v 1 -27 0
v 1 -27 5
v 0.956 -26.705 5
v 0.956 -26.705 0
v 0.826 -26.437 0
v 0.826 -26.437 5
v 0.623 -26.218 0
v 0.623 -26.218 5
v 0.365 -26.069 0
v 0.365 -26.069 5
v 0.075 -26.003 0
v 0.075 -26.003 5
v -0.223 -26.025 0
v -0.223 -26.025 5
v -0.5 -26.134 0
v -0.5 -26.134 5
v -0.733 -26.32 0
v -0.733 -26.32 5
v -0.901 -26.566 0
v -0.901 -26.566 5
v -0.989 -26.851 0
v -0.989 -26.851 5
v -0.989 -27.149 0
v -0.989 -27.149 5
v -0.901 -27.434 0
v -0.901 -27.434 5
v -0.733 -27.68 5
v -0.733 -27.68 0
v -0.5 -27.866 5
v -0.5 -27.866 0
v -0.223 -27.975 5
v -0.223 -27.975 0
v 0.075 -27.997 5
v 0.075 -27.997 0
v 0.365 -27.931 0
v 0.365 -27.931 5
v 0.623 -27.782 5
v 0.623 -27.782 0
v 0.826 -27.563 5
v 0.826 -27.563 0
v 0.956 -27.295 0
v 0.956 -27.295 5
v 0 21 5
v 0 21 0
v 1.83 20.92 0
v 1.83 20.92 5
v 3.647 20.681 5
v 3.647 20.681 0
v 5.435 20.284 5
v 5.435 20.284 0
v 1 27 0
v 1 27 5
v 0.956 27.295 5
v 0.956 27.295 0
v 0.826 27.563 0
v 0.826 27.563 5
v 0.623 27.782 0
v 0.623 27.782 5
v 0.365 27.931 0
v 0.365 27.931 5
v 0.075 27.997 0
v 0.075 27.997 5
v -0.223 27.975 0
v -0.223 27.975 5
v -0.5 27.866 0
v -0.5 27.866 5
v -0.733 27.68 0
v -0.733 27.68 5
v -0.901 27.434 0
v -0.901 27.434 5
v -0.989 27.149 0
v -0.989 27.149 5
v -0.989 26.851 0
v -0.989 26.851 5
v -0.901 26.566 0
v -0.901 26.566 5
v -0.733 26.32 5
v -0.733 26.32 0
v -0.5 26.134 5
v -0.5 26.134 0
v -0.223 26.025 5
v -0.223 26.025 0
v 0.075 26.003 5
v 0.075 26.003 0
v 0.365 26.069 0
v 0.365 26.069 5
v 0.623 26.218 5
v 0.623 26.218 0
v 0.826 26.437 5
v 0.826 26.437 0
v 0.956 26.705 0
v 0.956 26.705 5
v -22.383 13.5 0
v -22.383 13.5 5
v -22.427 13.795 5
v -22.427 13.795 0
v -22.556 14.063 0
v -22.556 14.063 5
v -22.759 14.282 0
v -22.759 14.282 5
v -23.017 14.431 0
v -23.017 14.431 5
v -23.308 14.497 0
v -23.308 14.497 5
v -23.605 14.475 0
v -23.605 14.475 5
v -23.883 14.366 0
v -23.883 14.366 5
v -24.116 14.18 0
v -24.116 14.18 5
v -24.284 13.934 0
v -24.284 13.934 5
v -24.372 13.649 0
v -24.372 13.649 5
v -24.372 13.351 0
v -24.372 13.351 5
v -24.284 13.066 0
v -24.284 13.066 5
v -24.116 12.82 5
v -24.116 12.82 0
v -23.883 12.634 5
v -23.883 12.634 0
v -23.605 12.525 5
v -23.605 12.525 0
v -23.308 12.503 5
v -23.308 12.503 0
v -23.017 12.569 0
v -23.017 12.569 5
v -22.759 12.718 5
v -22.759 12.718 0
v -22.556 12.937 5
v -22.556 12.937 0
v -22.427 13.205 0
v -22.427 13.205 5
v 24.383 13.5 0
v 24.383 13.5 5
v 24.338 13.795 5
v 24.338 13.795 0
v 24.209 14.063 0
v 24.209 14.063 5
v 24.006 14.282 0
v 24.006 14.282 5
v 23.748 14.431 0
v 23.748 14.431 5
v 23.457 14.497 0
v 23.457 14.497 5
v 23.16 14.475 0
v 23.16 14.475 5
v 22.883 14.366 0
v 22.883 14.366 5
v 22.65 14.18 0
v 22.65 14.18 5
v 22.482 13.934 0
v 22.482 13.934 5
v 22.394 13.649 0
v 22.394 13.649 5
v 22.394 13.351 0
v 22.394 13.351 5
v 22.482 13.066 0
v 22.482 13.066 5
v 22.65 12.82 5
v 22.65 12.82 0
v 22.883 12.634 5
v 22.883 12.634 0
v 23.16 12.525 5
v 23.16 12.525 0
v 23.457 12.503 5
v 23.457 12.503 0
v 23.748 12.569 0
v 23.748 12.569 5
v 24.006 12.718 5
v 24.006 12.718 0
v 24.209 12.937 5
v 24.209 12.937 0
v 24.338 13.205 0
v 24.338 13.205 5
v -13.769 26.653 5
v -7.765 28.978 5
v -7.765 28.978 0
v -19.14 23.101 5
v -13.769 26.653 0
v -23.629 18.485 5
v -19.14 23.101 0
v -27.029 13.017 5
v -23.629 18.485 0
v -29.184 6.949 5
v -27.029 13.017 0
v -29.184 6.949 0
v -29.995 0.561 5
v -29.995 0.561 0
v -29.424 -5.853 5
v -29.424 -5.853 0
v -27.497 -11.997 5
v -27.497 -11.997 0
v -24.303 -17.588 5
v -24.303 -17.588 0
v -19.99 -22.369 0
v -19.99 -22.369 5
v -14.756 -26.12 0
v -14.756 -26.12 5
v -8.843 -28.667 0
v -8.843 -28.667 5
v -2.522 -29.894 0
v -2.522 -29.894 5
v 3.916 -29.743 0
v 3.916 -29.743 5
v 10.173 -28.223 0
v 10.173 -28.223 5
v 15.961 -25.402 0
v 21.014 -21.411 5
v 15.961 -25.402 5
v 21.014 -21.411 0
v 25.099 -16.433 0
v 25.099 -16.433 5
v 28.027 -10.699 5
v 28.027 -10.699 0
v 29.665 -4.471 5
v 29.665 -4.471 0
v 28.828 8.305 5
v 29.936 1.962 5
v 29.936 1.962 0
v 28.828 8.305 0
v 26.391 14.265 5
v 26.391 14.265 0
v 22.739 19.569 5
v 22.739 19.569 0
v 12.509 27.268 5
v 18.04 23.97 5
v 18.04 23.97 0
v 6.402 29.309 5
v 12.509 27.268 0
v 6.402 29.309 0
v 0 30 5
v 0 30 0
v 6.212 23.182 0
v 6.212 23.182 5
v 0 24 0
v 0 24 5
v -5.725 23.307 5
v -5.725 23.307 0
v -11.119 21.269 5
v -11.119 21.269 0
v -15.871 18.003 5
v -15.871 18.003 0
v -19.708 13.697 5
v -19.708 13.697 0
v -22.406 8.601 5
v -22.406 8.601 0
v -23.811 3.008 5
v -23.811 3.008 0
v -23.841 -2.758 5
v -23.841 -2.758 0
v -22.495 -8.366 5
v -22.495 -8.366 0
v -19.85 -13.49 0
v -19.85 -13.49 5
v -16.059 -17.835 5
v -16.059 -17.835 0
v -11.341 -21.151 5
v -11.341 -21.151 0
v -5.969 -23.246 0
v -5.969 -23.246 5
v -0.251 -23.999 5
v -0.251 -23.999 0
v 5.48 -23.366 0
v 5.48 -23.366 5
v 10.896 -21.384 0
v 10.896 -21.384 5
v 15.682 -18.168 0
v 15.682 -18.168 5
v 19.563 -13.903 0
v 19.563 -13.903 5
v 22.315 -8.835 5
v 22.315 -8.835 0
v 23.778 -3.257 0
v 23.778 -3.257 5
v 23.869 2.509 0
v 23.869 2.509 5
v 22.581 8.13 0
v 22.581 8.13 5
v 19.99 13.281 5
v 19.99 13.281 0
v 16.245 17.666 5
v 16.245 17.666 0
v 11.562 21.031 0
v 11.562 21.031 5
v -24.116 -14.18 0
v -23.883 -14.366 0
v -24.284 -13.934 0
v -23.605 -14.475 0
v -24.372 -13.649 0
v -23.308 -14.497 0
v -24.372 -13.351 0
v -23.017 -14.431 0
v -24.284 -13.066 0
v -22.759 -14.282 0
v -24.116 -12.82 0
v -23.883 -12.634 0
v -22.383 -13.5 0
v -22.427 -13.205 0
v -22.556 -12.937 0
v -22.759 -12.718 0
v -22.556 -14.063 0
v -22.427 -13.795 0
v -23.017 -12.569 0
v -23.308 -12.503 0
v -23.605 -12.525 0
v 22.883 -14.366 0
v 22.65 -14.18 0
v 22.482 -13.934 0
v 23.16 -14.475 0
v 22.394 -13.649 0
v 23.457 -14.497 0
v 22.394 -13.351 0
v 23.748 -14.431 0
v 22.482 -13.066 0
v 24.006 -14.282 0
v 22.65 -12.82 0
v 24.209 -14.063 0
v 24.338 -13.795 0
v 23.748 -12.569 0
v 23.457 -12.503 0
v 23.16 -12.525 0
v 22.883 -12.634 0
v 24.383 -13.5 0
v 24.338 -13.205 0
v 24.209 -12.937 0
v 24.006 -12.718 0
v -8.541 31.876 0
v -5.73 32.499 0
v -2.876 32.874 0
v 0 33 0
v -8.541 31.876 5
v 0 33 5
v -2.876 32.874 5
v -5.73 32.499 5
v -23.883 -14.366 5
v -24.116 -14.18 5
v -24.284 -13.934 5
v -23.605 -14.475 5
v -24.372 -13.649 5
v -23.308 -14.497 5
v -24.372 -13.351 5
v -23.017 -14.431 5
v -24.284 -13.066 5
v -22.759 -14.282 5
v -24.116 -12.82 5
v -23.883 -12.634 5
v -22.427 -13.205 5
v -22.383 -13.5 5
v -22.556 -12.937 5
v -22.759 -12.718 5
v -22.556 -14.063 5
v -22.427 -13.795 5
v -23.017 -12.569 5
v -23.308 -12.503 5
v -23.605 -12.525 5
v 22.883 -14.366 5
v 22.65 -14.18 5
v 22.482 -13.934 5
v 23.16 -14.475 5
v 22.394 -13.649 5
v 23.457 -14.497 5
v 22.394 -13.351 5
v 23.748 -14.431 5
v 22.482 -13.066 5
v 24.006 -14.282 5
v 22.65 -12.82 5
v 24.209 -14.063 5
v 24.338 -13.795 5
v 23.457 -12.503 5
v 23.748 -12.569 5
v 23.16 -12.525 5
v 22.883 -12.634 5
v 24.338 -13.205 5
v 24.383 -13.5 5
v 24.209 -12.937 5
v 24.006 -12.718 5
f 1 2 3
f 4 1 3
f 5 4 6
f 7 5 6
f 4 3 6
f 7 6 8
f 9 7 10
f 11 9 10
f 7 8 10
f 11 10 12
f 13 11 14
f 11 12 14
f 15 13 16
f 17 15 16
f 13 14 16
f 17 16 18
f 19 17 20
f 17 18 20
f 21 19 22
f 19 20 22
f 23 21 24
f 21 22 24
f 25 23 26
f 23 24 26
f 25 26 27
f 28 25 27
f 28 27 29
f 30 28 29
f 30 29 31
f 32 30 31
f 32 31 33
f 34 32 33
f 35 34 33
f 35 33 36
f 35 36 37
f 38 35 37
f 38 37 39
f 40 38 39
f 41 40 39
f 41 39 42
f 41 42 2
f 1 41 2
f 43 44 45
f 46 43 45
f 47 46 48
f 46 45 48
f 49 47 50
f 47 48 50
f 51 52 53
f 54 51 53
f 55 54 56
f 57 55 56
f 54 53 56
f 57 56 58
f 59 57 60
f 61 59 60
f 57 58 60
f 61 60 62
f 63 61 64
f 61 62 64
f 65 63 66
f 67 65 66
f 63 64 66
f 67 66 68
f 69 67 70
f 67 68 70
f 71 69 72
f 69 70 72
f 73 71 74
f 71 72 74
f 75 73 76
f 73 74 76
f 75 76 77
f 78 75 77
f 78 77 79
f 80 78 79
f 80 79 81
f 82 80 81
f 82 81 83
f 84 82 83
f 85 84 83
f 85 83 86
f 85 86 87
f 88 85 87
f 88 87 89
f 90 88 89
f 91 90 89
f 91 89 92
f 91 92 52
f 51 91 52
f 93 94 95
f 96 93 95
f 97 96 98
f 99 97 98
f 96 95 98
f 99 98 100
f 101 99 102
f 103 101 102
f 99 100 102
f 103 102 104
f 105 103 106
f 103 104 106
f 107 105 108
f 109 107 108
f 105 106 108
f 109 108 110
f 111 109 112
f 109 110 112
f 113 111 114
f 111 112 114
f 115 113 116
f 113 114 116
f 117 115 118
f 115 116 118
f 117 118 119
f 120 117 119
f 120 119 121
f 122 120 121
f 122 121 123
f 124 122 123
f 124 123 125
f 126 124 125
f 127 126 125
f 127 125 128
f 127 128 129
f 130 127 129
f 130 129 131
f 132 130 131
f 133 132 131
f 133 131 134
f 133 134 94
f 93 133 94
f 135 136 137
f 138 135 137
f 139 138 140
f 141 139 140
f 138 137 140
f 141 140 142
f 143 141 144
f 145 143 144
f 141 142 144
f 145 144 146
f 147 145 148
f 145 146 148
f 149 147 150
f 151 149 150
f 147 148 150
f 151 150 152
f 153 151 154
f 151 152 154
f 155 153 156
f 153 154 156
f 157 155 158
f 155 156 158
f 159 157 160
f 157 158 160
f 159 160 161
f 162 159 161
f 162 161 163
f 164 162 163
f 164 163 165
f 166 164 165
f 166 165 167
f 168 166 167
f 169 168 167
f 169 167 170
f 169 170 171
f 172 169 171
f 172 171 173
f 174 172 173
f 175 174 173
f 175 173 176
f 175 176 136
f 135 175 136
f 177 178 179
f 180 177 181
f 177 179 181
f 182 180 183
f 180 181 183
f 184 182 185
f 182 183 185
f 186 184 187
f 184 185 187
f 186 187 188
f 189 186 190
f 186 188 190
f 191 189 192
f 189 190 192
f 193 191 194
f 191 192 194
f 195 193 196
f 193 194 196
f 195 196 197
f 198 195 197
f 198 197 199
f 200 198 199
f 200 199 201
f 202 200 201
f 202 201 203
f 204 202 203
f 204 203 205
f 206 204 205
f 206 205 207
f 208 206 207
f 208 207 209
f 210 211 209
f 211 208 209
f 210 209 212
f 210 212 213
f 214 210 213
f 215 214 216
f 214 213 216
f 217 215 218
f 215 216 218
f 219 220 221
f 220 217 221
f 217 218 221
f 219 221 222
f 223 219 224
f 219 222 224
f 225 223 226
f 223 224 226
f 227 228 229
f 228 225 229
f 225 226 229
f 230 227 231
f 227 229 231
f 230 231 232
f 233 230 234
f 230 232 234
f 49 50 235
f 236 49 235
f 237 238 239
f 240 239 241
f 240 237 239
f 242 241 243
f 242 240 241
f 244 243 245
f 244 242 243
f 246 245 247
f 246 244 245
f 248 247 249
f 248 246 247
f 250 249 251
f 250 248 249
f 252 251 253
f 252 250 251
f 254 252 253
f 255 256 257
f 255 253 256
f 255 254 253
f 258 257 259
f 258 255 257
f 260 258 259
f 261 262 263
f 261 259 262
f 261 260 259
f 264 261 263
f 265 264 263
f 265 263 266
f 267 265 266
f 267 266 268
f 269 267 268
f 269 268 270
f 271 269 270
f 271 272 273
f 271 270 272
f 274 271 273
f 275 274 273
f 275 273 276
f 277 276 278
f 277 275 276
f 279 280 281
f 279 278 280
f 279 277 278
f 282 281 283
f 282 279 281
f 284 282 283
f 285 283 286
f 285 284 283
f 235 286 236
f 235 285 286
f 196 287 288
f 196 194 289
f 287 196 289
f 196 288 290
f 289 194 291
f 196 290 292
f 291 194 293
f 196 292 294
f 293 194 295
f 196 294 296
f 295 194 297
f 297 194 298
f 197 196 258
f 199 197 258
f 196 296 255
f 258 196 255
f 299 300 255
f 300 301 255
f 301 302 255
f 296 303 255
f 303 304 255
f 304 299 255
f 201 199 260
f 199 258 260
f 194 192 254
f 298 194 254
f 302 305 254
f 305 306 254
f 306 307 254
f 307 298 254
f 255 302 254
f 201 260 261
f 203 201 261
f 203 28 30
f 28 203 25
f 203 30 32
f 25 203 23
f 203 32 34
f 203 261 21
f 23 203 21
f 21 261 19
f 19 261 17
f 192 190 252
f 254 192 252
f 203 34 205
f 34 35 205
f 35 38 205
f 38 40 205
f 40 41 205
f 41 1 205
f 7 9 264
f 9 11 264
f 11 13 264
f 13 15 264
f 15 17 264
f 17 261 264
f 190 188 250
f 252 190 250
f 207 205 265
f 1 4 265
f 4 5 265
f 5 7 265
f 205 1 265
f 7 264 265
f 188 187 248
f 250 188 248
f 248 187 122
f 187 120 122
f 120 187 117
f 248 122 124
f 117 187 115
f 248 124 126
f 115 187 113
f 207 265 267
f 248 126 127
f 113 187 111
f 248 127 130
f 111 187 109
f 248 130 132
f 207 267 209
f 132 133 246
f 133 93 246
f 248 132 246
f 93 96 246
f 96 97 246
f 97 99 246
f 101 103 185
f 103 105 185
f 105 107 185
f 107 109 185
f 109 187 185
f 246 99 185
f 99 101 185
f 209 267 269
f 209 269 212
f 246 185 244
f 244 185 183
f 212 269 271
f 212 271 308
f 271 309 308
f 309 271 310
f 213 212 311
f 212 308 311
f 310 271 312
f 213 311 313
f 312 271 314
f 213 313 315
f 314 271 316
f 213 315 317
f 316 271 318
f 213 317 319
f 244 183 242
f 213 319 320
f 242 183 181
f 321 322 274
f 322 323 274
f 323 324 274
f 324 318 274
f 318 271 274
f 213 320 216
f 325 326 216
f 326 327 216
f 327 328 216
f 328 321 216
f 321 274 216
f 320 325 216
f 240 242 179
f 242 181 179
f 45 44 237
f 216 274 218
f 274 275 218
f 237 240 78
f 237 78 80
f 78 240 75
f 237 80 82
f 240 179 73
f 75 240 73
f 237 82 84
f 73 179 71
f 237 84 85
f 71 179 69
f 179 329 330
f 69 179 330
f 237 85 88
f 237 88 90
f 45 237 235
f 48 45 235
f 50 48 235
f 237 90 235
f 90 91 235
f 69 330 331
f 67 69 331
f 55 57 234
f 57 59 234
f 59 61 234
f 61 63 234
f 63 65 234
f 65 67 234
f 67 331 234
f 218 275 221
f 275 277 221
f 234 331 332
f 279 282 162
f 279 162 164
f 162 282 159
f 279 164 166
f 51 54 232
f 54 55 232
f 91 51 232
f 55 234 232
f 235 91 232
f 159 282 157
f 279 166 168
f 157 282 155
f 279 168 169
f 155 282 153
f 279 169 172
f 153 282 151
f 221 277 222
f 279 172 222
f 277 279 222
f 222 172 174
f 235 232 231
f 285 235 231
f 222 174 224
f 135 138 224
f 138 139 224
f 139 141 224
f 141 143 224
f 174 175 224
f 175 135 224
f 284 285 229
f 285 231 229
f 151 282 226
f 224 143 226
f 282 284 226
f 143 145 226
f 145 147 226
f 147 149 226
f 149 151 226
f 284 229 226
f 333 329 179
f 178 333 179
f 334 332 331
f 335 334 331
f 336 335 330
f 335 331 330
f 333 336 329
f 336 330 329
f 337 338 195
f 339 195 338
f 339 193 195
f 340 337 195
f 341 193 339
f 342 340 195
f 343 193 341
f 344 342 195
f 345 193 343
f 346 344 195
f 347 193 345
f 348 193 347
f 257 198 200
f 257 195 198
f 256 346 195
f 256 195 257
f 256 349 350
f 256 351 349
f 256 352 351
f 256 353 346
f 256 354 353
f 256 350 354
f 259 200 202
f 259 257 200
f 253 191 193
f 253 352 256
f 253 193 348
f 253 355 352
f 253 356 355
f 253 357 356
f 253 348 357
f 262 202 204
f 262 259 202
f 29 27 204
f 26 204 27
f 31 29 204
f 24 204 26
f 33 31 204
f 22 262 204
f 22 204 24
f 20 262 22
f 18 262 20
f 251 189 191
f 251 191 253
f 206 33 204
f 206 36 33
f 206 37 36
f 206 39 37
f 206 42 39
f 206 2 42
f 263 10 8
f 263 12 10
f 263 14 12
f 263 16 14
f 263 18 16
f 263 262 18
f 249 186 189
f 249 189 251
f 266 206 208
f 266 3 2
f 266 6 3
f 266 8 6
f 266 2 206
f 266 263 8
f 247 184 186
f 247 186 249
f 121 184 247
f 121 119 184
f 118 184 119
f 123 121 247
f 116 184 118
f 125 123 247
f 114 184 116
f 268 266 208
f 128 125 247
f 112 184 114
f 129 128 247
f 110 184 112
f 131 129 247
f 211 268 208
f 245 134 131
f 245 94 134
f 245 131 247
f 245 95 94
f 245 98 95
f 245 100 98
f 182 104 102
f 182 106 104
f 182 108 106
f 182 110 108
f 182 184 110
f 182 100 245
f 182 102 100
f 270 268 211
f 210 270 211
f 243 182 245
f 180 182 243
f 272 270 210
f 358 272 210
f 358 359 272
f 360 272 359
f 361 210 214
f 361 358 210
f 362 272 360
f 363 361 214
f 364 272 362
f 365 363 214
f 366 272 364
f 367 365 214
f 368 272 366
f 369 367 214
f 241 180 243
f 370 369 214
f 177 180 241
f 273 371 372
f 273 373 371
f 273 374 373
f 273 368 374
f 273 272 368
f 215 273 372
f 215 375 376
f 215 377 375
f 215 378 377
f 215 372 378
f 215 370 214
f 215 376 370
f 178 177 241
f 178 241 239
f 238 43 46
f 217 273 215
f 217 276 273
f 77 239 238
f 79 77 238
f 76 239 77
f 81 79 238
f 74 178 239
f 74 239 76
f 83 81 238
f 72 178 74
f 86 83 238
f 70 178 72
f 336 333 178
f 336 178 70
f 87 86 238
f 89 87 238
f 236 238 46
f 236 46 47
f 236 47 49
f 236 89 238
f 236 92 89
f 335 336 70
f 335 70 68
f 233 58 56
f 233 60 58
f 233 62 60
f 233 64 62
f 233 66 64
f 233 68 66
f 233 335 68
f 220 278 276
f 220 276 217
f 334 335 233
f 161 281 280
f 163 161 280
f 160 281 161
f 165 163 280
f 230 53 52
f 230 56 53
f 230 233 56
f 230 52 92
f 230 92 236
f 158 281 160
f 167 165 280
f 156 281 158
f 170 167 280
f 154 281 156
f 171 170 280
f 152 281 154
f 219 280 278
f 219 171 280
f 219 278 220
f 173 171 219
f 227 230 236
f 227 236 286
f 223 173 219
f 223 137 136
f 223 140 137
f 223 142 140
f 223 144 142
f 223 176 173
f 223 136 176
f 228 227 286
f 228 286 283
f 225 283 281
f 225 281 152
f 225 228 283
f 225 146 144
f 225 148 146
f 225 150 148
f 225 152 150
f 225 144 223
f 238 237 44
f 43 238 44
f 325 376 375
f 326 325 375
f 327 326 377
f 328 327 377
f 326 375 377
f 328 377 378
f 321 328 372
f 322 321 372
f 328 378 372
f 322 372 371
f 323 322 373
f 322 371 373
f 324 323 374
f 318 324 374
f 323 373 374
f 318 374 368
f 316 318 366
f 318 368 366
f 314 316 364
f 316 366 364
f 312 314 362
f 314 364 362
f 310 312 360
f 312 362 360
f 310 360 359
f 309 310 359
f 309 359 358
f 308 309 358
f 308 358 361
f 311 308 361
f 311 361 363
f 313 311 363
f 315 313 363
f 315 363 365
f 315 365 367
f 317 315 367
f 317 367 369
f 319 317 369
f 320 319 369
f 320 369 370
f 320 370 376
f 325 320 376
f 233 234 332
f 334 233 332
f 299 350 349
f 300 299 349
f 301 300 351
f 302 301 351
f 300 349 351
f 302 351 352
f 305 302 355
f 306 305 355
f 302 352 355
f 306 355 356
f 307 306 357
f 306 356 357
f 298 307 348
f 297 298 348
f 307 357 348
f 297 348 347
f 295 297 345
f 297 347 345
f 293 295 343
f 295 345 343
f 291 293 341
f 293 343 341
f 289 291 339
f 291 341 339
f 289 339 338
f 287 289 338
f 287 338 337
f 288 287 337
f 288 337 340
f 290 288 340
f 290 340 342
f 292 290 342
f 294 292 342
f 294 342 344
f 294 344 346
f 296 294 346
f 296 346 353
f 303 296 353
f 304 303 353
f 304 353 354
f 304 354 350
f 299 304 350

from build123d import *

# Parameters (mm, degrees)
SKETCH_1_R          = 30
SKETCH_1_R_2        = 24
EXTRUDE_1_DEPTH     = 5
SKETCH_2_R          = 1
CUT_EXTRUDE_1_DEPTH = 43.720018727
EXTRUDE_START       = -5
EXTRUDE_2_DEPTH     = 5


with BuildPart() as part:
    # 草图1 → 凸台-拉伸1 (new body)
    with BuildSketch(Plane.XY):
        Circle(SKETCH_1_R)
        Circle(SKETCH_1_R_2, mode=Mode.SUBTRACT)
    extrude(amount=EXTRUDE_1_DEPTH)

    # 草图2 → 切除-拉伸1 (cut, through all)
    with BuildSketch(Plane.XY.offset(5)):
        with Locations((0, 27)):
            Circle(SKETCH_2_R)
        with Locations((23.382685902, 13.5)):
            Circle(SKETCH_2_R)
        with Locations((23.382685902, -13.5)):
            Circle(SKETCH_2_R)
        with Locations((0, -27)):
            Circle(SKETCH_2_R)
        with Locations((-23.382685902, -13.5)):
            Circle(SKETCH_2_R)
        with Locations((-23.382685902, 13.5)):
            Circle(SKETCH_2_R)
    extrude(amount=-CUT_EXTRUDE_1_DEPTH, mode=Mode.SUBTRACT)

    # 草图3 → 凸台-拉伸2 (add)
    with BuildSketch(Plane.XY.offset(5).offset(EXTRUDE_START)):
        with BuildLine():
            Line((5.435199947, 20.284442352), (6.211657082, 23.182219831))
            ThreePointArc((6.211657082, 23.182219831), (3.132628613, 23.794676673), (0, 24))
            Line((0, 24), (0, 21))
            ThreePointArc((0, 21), (2.741050037, 20.820342089), (5.435199947, 20.284442352))
        make_face()
        with BuildLine():
            Line((0, 30), (0, 33))
            ThreePointArc((0, 33), (-4.307364343, 32.717680425), (-8.541028488, 31.875552268))
            Line((-8.541028488, 31.875552268), (-7.764571353, 28.977774789))
            ThreePointArc((-7.764571353, 28.977774789), (-3.915785767, 29.743345841), (0, 30))
        make_face()
    extrude(amount=EXTRUDE_2_DEPTH)


solid = part.part
